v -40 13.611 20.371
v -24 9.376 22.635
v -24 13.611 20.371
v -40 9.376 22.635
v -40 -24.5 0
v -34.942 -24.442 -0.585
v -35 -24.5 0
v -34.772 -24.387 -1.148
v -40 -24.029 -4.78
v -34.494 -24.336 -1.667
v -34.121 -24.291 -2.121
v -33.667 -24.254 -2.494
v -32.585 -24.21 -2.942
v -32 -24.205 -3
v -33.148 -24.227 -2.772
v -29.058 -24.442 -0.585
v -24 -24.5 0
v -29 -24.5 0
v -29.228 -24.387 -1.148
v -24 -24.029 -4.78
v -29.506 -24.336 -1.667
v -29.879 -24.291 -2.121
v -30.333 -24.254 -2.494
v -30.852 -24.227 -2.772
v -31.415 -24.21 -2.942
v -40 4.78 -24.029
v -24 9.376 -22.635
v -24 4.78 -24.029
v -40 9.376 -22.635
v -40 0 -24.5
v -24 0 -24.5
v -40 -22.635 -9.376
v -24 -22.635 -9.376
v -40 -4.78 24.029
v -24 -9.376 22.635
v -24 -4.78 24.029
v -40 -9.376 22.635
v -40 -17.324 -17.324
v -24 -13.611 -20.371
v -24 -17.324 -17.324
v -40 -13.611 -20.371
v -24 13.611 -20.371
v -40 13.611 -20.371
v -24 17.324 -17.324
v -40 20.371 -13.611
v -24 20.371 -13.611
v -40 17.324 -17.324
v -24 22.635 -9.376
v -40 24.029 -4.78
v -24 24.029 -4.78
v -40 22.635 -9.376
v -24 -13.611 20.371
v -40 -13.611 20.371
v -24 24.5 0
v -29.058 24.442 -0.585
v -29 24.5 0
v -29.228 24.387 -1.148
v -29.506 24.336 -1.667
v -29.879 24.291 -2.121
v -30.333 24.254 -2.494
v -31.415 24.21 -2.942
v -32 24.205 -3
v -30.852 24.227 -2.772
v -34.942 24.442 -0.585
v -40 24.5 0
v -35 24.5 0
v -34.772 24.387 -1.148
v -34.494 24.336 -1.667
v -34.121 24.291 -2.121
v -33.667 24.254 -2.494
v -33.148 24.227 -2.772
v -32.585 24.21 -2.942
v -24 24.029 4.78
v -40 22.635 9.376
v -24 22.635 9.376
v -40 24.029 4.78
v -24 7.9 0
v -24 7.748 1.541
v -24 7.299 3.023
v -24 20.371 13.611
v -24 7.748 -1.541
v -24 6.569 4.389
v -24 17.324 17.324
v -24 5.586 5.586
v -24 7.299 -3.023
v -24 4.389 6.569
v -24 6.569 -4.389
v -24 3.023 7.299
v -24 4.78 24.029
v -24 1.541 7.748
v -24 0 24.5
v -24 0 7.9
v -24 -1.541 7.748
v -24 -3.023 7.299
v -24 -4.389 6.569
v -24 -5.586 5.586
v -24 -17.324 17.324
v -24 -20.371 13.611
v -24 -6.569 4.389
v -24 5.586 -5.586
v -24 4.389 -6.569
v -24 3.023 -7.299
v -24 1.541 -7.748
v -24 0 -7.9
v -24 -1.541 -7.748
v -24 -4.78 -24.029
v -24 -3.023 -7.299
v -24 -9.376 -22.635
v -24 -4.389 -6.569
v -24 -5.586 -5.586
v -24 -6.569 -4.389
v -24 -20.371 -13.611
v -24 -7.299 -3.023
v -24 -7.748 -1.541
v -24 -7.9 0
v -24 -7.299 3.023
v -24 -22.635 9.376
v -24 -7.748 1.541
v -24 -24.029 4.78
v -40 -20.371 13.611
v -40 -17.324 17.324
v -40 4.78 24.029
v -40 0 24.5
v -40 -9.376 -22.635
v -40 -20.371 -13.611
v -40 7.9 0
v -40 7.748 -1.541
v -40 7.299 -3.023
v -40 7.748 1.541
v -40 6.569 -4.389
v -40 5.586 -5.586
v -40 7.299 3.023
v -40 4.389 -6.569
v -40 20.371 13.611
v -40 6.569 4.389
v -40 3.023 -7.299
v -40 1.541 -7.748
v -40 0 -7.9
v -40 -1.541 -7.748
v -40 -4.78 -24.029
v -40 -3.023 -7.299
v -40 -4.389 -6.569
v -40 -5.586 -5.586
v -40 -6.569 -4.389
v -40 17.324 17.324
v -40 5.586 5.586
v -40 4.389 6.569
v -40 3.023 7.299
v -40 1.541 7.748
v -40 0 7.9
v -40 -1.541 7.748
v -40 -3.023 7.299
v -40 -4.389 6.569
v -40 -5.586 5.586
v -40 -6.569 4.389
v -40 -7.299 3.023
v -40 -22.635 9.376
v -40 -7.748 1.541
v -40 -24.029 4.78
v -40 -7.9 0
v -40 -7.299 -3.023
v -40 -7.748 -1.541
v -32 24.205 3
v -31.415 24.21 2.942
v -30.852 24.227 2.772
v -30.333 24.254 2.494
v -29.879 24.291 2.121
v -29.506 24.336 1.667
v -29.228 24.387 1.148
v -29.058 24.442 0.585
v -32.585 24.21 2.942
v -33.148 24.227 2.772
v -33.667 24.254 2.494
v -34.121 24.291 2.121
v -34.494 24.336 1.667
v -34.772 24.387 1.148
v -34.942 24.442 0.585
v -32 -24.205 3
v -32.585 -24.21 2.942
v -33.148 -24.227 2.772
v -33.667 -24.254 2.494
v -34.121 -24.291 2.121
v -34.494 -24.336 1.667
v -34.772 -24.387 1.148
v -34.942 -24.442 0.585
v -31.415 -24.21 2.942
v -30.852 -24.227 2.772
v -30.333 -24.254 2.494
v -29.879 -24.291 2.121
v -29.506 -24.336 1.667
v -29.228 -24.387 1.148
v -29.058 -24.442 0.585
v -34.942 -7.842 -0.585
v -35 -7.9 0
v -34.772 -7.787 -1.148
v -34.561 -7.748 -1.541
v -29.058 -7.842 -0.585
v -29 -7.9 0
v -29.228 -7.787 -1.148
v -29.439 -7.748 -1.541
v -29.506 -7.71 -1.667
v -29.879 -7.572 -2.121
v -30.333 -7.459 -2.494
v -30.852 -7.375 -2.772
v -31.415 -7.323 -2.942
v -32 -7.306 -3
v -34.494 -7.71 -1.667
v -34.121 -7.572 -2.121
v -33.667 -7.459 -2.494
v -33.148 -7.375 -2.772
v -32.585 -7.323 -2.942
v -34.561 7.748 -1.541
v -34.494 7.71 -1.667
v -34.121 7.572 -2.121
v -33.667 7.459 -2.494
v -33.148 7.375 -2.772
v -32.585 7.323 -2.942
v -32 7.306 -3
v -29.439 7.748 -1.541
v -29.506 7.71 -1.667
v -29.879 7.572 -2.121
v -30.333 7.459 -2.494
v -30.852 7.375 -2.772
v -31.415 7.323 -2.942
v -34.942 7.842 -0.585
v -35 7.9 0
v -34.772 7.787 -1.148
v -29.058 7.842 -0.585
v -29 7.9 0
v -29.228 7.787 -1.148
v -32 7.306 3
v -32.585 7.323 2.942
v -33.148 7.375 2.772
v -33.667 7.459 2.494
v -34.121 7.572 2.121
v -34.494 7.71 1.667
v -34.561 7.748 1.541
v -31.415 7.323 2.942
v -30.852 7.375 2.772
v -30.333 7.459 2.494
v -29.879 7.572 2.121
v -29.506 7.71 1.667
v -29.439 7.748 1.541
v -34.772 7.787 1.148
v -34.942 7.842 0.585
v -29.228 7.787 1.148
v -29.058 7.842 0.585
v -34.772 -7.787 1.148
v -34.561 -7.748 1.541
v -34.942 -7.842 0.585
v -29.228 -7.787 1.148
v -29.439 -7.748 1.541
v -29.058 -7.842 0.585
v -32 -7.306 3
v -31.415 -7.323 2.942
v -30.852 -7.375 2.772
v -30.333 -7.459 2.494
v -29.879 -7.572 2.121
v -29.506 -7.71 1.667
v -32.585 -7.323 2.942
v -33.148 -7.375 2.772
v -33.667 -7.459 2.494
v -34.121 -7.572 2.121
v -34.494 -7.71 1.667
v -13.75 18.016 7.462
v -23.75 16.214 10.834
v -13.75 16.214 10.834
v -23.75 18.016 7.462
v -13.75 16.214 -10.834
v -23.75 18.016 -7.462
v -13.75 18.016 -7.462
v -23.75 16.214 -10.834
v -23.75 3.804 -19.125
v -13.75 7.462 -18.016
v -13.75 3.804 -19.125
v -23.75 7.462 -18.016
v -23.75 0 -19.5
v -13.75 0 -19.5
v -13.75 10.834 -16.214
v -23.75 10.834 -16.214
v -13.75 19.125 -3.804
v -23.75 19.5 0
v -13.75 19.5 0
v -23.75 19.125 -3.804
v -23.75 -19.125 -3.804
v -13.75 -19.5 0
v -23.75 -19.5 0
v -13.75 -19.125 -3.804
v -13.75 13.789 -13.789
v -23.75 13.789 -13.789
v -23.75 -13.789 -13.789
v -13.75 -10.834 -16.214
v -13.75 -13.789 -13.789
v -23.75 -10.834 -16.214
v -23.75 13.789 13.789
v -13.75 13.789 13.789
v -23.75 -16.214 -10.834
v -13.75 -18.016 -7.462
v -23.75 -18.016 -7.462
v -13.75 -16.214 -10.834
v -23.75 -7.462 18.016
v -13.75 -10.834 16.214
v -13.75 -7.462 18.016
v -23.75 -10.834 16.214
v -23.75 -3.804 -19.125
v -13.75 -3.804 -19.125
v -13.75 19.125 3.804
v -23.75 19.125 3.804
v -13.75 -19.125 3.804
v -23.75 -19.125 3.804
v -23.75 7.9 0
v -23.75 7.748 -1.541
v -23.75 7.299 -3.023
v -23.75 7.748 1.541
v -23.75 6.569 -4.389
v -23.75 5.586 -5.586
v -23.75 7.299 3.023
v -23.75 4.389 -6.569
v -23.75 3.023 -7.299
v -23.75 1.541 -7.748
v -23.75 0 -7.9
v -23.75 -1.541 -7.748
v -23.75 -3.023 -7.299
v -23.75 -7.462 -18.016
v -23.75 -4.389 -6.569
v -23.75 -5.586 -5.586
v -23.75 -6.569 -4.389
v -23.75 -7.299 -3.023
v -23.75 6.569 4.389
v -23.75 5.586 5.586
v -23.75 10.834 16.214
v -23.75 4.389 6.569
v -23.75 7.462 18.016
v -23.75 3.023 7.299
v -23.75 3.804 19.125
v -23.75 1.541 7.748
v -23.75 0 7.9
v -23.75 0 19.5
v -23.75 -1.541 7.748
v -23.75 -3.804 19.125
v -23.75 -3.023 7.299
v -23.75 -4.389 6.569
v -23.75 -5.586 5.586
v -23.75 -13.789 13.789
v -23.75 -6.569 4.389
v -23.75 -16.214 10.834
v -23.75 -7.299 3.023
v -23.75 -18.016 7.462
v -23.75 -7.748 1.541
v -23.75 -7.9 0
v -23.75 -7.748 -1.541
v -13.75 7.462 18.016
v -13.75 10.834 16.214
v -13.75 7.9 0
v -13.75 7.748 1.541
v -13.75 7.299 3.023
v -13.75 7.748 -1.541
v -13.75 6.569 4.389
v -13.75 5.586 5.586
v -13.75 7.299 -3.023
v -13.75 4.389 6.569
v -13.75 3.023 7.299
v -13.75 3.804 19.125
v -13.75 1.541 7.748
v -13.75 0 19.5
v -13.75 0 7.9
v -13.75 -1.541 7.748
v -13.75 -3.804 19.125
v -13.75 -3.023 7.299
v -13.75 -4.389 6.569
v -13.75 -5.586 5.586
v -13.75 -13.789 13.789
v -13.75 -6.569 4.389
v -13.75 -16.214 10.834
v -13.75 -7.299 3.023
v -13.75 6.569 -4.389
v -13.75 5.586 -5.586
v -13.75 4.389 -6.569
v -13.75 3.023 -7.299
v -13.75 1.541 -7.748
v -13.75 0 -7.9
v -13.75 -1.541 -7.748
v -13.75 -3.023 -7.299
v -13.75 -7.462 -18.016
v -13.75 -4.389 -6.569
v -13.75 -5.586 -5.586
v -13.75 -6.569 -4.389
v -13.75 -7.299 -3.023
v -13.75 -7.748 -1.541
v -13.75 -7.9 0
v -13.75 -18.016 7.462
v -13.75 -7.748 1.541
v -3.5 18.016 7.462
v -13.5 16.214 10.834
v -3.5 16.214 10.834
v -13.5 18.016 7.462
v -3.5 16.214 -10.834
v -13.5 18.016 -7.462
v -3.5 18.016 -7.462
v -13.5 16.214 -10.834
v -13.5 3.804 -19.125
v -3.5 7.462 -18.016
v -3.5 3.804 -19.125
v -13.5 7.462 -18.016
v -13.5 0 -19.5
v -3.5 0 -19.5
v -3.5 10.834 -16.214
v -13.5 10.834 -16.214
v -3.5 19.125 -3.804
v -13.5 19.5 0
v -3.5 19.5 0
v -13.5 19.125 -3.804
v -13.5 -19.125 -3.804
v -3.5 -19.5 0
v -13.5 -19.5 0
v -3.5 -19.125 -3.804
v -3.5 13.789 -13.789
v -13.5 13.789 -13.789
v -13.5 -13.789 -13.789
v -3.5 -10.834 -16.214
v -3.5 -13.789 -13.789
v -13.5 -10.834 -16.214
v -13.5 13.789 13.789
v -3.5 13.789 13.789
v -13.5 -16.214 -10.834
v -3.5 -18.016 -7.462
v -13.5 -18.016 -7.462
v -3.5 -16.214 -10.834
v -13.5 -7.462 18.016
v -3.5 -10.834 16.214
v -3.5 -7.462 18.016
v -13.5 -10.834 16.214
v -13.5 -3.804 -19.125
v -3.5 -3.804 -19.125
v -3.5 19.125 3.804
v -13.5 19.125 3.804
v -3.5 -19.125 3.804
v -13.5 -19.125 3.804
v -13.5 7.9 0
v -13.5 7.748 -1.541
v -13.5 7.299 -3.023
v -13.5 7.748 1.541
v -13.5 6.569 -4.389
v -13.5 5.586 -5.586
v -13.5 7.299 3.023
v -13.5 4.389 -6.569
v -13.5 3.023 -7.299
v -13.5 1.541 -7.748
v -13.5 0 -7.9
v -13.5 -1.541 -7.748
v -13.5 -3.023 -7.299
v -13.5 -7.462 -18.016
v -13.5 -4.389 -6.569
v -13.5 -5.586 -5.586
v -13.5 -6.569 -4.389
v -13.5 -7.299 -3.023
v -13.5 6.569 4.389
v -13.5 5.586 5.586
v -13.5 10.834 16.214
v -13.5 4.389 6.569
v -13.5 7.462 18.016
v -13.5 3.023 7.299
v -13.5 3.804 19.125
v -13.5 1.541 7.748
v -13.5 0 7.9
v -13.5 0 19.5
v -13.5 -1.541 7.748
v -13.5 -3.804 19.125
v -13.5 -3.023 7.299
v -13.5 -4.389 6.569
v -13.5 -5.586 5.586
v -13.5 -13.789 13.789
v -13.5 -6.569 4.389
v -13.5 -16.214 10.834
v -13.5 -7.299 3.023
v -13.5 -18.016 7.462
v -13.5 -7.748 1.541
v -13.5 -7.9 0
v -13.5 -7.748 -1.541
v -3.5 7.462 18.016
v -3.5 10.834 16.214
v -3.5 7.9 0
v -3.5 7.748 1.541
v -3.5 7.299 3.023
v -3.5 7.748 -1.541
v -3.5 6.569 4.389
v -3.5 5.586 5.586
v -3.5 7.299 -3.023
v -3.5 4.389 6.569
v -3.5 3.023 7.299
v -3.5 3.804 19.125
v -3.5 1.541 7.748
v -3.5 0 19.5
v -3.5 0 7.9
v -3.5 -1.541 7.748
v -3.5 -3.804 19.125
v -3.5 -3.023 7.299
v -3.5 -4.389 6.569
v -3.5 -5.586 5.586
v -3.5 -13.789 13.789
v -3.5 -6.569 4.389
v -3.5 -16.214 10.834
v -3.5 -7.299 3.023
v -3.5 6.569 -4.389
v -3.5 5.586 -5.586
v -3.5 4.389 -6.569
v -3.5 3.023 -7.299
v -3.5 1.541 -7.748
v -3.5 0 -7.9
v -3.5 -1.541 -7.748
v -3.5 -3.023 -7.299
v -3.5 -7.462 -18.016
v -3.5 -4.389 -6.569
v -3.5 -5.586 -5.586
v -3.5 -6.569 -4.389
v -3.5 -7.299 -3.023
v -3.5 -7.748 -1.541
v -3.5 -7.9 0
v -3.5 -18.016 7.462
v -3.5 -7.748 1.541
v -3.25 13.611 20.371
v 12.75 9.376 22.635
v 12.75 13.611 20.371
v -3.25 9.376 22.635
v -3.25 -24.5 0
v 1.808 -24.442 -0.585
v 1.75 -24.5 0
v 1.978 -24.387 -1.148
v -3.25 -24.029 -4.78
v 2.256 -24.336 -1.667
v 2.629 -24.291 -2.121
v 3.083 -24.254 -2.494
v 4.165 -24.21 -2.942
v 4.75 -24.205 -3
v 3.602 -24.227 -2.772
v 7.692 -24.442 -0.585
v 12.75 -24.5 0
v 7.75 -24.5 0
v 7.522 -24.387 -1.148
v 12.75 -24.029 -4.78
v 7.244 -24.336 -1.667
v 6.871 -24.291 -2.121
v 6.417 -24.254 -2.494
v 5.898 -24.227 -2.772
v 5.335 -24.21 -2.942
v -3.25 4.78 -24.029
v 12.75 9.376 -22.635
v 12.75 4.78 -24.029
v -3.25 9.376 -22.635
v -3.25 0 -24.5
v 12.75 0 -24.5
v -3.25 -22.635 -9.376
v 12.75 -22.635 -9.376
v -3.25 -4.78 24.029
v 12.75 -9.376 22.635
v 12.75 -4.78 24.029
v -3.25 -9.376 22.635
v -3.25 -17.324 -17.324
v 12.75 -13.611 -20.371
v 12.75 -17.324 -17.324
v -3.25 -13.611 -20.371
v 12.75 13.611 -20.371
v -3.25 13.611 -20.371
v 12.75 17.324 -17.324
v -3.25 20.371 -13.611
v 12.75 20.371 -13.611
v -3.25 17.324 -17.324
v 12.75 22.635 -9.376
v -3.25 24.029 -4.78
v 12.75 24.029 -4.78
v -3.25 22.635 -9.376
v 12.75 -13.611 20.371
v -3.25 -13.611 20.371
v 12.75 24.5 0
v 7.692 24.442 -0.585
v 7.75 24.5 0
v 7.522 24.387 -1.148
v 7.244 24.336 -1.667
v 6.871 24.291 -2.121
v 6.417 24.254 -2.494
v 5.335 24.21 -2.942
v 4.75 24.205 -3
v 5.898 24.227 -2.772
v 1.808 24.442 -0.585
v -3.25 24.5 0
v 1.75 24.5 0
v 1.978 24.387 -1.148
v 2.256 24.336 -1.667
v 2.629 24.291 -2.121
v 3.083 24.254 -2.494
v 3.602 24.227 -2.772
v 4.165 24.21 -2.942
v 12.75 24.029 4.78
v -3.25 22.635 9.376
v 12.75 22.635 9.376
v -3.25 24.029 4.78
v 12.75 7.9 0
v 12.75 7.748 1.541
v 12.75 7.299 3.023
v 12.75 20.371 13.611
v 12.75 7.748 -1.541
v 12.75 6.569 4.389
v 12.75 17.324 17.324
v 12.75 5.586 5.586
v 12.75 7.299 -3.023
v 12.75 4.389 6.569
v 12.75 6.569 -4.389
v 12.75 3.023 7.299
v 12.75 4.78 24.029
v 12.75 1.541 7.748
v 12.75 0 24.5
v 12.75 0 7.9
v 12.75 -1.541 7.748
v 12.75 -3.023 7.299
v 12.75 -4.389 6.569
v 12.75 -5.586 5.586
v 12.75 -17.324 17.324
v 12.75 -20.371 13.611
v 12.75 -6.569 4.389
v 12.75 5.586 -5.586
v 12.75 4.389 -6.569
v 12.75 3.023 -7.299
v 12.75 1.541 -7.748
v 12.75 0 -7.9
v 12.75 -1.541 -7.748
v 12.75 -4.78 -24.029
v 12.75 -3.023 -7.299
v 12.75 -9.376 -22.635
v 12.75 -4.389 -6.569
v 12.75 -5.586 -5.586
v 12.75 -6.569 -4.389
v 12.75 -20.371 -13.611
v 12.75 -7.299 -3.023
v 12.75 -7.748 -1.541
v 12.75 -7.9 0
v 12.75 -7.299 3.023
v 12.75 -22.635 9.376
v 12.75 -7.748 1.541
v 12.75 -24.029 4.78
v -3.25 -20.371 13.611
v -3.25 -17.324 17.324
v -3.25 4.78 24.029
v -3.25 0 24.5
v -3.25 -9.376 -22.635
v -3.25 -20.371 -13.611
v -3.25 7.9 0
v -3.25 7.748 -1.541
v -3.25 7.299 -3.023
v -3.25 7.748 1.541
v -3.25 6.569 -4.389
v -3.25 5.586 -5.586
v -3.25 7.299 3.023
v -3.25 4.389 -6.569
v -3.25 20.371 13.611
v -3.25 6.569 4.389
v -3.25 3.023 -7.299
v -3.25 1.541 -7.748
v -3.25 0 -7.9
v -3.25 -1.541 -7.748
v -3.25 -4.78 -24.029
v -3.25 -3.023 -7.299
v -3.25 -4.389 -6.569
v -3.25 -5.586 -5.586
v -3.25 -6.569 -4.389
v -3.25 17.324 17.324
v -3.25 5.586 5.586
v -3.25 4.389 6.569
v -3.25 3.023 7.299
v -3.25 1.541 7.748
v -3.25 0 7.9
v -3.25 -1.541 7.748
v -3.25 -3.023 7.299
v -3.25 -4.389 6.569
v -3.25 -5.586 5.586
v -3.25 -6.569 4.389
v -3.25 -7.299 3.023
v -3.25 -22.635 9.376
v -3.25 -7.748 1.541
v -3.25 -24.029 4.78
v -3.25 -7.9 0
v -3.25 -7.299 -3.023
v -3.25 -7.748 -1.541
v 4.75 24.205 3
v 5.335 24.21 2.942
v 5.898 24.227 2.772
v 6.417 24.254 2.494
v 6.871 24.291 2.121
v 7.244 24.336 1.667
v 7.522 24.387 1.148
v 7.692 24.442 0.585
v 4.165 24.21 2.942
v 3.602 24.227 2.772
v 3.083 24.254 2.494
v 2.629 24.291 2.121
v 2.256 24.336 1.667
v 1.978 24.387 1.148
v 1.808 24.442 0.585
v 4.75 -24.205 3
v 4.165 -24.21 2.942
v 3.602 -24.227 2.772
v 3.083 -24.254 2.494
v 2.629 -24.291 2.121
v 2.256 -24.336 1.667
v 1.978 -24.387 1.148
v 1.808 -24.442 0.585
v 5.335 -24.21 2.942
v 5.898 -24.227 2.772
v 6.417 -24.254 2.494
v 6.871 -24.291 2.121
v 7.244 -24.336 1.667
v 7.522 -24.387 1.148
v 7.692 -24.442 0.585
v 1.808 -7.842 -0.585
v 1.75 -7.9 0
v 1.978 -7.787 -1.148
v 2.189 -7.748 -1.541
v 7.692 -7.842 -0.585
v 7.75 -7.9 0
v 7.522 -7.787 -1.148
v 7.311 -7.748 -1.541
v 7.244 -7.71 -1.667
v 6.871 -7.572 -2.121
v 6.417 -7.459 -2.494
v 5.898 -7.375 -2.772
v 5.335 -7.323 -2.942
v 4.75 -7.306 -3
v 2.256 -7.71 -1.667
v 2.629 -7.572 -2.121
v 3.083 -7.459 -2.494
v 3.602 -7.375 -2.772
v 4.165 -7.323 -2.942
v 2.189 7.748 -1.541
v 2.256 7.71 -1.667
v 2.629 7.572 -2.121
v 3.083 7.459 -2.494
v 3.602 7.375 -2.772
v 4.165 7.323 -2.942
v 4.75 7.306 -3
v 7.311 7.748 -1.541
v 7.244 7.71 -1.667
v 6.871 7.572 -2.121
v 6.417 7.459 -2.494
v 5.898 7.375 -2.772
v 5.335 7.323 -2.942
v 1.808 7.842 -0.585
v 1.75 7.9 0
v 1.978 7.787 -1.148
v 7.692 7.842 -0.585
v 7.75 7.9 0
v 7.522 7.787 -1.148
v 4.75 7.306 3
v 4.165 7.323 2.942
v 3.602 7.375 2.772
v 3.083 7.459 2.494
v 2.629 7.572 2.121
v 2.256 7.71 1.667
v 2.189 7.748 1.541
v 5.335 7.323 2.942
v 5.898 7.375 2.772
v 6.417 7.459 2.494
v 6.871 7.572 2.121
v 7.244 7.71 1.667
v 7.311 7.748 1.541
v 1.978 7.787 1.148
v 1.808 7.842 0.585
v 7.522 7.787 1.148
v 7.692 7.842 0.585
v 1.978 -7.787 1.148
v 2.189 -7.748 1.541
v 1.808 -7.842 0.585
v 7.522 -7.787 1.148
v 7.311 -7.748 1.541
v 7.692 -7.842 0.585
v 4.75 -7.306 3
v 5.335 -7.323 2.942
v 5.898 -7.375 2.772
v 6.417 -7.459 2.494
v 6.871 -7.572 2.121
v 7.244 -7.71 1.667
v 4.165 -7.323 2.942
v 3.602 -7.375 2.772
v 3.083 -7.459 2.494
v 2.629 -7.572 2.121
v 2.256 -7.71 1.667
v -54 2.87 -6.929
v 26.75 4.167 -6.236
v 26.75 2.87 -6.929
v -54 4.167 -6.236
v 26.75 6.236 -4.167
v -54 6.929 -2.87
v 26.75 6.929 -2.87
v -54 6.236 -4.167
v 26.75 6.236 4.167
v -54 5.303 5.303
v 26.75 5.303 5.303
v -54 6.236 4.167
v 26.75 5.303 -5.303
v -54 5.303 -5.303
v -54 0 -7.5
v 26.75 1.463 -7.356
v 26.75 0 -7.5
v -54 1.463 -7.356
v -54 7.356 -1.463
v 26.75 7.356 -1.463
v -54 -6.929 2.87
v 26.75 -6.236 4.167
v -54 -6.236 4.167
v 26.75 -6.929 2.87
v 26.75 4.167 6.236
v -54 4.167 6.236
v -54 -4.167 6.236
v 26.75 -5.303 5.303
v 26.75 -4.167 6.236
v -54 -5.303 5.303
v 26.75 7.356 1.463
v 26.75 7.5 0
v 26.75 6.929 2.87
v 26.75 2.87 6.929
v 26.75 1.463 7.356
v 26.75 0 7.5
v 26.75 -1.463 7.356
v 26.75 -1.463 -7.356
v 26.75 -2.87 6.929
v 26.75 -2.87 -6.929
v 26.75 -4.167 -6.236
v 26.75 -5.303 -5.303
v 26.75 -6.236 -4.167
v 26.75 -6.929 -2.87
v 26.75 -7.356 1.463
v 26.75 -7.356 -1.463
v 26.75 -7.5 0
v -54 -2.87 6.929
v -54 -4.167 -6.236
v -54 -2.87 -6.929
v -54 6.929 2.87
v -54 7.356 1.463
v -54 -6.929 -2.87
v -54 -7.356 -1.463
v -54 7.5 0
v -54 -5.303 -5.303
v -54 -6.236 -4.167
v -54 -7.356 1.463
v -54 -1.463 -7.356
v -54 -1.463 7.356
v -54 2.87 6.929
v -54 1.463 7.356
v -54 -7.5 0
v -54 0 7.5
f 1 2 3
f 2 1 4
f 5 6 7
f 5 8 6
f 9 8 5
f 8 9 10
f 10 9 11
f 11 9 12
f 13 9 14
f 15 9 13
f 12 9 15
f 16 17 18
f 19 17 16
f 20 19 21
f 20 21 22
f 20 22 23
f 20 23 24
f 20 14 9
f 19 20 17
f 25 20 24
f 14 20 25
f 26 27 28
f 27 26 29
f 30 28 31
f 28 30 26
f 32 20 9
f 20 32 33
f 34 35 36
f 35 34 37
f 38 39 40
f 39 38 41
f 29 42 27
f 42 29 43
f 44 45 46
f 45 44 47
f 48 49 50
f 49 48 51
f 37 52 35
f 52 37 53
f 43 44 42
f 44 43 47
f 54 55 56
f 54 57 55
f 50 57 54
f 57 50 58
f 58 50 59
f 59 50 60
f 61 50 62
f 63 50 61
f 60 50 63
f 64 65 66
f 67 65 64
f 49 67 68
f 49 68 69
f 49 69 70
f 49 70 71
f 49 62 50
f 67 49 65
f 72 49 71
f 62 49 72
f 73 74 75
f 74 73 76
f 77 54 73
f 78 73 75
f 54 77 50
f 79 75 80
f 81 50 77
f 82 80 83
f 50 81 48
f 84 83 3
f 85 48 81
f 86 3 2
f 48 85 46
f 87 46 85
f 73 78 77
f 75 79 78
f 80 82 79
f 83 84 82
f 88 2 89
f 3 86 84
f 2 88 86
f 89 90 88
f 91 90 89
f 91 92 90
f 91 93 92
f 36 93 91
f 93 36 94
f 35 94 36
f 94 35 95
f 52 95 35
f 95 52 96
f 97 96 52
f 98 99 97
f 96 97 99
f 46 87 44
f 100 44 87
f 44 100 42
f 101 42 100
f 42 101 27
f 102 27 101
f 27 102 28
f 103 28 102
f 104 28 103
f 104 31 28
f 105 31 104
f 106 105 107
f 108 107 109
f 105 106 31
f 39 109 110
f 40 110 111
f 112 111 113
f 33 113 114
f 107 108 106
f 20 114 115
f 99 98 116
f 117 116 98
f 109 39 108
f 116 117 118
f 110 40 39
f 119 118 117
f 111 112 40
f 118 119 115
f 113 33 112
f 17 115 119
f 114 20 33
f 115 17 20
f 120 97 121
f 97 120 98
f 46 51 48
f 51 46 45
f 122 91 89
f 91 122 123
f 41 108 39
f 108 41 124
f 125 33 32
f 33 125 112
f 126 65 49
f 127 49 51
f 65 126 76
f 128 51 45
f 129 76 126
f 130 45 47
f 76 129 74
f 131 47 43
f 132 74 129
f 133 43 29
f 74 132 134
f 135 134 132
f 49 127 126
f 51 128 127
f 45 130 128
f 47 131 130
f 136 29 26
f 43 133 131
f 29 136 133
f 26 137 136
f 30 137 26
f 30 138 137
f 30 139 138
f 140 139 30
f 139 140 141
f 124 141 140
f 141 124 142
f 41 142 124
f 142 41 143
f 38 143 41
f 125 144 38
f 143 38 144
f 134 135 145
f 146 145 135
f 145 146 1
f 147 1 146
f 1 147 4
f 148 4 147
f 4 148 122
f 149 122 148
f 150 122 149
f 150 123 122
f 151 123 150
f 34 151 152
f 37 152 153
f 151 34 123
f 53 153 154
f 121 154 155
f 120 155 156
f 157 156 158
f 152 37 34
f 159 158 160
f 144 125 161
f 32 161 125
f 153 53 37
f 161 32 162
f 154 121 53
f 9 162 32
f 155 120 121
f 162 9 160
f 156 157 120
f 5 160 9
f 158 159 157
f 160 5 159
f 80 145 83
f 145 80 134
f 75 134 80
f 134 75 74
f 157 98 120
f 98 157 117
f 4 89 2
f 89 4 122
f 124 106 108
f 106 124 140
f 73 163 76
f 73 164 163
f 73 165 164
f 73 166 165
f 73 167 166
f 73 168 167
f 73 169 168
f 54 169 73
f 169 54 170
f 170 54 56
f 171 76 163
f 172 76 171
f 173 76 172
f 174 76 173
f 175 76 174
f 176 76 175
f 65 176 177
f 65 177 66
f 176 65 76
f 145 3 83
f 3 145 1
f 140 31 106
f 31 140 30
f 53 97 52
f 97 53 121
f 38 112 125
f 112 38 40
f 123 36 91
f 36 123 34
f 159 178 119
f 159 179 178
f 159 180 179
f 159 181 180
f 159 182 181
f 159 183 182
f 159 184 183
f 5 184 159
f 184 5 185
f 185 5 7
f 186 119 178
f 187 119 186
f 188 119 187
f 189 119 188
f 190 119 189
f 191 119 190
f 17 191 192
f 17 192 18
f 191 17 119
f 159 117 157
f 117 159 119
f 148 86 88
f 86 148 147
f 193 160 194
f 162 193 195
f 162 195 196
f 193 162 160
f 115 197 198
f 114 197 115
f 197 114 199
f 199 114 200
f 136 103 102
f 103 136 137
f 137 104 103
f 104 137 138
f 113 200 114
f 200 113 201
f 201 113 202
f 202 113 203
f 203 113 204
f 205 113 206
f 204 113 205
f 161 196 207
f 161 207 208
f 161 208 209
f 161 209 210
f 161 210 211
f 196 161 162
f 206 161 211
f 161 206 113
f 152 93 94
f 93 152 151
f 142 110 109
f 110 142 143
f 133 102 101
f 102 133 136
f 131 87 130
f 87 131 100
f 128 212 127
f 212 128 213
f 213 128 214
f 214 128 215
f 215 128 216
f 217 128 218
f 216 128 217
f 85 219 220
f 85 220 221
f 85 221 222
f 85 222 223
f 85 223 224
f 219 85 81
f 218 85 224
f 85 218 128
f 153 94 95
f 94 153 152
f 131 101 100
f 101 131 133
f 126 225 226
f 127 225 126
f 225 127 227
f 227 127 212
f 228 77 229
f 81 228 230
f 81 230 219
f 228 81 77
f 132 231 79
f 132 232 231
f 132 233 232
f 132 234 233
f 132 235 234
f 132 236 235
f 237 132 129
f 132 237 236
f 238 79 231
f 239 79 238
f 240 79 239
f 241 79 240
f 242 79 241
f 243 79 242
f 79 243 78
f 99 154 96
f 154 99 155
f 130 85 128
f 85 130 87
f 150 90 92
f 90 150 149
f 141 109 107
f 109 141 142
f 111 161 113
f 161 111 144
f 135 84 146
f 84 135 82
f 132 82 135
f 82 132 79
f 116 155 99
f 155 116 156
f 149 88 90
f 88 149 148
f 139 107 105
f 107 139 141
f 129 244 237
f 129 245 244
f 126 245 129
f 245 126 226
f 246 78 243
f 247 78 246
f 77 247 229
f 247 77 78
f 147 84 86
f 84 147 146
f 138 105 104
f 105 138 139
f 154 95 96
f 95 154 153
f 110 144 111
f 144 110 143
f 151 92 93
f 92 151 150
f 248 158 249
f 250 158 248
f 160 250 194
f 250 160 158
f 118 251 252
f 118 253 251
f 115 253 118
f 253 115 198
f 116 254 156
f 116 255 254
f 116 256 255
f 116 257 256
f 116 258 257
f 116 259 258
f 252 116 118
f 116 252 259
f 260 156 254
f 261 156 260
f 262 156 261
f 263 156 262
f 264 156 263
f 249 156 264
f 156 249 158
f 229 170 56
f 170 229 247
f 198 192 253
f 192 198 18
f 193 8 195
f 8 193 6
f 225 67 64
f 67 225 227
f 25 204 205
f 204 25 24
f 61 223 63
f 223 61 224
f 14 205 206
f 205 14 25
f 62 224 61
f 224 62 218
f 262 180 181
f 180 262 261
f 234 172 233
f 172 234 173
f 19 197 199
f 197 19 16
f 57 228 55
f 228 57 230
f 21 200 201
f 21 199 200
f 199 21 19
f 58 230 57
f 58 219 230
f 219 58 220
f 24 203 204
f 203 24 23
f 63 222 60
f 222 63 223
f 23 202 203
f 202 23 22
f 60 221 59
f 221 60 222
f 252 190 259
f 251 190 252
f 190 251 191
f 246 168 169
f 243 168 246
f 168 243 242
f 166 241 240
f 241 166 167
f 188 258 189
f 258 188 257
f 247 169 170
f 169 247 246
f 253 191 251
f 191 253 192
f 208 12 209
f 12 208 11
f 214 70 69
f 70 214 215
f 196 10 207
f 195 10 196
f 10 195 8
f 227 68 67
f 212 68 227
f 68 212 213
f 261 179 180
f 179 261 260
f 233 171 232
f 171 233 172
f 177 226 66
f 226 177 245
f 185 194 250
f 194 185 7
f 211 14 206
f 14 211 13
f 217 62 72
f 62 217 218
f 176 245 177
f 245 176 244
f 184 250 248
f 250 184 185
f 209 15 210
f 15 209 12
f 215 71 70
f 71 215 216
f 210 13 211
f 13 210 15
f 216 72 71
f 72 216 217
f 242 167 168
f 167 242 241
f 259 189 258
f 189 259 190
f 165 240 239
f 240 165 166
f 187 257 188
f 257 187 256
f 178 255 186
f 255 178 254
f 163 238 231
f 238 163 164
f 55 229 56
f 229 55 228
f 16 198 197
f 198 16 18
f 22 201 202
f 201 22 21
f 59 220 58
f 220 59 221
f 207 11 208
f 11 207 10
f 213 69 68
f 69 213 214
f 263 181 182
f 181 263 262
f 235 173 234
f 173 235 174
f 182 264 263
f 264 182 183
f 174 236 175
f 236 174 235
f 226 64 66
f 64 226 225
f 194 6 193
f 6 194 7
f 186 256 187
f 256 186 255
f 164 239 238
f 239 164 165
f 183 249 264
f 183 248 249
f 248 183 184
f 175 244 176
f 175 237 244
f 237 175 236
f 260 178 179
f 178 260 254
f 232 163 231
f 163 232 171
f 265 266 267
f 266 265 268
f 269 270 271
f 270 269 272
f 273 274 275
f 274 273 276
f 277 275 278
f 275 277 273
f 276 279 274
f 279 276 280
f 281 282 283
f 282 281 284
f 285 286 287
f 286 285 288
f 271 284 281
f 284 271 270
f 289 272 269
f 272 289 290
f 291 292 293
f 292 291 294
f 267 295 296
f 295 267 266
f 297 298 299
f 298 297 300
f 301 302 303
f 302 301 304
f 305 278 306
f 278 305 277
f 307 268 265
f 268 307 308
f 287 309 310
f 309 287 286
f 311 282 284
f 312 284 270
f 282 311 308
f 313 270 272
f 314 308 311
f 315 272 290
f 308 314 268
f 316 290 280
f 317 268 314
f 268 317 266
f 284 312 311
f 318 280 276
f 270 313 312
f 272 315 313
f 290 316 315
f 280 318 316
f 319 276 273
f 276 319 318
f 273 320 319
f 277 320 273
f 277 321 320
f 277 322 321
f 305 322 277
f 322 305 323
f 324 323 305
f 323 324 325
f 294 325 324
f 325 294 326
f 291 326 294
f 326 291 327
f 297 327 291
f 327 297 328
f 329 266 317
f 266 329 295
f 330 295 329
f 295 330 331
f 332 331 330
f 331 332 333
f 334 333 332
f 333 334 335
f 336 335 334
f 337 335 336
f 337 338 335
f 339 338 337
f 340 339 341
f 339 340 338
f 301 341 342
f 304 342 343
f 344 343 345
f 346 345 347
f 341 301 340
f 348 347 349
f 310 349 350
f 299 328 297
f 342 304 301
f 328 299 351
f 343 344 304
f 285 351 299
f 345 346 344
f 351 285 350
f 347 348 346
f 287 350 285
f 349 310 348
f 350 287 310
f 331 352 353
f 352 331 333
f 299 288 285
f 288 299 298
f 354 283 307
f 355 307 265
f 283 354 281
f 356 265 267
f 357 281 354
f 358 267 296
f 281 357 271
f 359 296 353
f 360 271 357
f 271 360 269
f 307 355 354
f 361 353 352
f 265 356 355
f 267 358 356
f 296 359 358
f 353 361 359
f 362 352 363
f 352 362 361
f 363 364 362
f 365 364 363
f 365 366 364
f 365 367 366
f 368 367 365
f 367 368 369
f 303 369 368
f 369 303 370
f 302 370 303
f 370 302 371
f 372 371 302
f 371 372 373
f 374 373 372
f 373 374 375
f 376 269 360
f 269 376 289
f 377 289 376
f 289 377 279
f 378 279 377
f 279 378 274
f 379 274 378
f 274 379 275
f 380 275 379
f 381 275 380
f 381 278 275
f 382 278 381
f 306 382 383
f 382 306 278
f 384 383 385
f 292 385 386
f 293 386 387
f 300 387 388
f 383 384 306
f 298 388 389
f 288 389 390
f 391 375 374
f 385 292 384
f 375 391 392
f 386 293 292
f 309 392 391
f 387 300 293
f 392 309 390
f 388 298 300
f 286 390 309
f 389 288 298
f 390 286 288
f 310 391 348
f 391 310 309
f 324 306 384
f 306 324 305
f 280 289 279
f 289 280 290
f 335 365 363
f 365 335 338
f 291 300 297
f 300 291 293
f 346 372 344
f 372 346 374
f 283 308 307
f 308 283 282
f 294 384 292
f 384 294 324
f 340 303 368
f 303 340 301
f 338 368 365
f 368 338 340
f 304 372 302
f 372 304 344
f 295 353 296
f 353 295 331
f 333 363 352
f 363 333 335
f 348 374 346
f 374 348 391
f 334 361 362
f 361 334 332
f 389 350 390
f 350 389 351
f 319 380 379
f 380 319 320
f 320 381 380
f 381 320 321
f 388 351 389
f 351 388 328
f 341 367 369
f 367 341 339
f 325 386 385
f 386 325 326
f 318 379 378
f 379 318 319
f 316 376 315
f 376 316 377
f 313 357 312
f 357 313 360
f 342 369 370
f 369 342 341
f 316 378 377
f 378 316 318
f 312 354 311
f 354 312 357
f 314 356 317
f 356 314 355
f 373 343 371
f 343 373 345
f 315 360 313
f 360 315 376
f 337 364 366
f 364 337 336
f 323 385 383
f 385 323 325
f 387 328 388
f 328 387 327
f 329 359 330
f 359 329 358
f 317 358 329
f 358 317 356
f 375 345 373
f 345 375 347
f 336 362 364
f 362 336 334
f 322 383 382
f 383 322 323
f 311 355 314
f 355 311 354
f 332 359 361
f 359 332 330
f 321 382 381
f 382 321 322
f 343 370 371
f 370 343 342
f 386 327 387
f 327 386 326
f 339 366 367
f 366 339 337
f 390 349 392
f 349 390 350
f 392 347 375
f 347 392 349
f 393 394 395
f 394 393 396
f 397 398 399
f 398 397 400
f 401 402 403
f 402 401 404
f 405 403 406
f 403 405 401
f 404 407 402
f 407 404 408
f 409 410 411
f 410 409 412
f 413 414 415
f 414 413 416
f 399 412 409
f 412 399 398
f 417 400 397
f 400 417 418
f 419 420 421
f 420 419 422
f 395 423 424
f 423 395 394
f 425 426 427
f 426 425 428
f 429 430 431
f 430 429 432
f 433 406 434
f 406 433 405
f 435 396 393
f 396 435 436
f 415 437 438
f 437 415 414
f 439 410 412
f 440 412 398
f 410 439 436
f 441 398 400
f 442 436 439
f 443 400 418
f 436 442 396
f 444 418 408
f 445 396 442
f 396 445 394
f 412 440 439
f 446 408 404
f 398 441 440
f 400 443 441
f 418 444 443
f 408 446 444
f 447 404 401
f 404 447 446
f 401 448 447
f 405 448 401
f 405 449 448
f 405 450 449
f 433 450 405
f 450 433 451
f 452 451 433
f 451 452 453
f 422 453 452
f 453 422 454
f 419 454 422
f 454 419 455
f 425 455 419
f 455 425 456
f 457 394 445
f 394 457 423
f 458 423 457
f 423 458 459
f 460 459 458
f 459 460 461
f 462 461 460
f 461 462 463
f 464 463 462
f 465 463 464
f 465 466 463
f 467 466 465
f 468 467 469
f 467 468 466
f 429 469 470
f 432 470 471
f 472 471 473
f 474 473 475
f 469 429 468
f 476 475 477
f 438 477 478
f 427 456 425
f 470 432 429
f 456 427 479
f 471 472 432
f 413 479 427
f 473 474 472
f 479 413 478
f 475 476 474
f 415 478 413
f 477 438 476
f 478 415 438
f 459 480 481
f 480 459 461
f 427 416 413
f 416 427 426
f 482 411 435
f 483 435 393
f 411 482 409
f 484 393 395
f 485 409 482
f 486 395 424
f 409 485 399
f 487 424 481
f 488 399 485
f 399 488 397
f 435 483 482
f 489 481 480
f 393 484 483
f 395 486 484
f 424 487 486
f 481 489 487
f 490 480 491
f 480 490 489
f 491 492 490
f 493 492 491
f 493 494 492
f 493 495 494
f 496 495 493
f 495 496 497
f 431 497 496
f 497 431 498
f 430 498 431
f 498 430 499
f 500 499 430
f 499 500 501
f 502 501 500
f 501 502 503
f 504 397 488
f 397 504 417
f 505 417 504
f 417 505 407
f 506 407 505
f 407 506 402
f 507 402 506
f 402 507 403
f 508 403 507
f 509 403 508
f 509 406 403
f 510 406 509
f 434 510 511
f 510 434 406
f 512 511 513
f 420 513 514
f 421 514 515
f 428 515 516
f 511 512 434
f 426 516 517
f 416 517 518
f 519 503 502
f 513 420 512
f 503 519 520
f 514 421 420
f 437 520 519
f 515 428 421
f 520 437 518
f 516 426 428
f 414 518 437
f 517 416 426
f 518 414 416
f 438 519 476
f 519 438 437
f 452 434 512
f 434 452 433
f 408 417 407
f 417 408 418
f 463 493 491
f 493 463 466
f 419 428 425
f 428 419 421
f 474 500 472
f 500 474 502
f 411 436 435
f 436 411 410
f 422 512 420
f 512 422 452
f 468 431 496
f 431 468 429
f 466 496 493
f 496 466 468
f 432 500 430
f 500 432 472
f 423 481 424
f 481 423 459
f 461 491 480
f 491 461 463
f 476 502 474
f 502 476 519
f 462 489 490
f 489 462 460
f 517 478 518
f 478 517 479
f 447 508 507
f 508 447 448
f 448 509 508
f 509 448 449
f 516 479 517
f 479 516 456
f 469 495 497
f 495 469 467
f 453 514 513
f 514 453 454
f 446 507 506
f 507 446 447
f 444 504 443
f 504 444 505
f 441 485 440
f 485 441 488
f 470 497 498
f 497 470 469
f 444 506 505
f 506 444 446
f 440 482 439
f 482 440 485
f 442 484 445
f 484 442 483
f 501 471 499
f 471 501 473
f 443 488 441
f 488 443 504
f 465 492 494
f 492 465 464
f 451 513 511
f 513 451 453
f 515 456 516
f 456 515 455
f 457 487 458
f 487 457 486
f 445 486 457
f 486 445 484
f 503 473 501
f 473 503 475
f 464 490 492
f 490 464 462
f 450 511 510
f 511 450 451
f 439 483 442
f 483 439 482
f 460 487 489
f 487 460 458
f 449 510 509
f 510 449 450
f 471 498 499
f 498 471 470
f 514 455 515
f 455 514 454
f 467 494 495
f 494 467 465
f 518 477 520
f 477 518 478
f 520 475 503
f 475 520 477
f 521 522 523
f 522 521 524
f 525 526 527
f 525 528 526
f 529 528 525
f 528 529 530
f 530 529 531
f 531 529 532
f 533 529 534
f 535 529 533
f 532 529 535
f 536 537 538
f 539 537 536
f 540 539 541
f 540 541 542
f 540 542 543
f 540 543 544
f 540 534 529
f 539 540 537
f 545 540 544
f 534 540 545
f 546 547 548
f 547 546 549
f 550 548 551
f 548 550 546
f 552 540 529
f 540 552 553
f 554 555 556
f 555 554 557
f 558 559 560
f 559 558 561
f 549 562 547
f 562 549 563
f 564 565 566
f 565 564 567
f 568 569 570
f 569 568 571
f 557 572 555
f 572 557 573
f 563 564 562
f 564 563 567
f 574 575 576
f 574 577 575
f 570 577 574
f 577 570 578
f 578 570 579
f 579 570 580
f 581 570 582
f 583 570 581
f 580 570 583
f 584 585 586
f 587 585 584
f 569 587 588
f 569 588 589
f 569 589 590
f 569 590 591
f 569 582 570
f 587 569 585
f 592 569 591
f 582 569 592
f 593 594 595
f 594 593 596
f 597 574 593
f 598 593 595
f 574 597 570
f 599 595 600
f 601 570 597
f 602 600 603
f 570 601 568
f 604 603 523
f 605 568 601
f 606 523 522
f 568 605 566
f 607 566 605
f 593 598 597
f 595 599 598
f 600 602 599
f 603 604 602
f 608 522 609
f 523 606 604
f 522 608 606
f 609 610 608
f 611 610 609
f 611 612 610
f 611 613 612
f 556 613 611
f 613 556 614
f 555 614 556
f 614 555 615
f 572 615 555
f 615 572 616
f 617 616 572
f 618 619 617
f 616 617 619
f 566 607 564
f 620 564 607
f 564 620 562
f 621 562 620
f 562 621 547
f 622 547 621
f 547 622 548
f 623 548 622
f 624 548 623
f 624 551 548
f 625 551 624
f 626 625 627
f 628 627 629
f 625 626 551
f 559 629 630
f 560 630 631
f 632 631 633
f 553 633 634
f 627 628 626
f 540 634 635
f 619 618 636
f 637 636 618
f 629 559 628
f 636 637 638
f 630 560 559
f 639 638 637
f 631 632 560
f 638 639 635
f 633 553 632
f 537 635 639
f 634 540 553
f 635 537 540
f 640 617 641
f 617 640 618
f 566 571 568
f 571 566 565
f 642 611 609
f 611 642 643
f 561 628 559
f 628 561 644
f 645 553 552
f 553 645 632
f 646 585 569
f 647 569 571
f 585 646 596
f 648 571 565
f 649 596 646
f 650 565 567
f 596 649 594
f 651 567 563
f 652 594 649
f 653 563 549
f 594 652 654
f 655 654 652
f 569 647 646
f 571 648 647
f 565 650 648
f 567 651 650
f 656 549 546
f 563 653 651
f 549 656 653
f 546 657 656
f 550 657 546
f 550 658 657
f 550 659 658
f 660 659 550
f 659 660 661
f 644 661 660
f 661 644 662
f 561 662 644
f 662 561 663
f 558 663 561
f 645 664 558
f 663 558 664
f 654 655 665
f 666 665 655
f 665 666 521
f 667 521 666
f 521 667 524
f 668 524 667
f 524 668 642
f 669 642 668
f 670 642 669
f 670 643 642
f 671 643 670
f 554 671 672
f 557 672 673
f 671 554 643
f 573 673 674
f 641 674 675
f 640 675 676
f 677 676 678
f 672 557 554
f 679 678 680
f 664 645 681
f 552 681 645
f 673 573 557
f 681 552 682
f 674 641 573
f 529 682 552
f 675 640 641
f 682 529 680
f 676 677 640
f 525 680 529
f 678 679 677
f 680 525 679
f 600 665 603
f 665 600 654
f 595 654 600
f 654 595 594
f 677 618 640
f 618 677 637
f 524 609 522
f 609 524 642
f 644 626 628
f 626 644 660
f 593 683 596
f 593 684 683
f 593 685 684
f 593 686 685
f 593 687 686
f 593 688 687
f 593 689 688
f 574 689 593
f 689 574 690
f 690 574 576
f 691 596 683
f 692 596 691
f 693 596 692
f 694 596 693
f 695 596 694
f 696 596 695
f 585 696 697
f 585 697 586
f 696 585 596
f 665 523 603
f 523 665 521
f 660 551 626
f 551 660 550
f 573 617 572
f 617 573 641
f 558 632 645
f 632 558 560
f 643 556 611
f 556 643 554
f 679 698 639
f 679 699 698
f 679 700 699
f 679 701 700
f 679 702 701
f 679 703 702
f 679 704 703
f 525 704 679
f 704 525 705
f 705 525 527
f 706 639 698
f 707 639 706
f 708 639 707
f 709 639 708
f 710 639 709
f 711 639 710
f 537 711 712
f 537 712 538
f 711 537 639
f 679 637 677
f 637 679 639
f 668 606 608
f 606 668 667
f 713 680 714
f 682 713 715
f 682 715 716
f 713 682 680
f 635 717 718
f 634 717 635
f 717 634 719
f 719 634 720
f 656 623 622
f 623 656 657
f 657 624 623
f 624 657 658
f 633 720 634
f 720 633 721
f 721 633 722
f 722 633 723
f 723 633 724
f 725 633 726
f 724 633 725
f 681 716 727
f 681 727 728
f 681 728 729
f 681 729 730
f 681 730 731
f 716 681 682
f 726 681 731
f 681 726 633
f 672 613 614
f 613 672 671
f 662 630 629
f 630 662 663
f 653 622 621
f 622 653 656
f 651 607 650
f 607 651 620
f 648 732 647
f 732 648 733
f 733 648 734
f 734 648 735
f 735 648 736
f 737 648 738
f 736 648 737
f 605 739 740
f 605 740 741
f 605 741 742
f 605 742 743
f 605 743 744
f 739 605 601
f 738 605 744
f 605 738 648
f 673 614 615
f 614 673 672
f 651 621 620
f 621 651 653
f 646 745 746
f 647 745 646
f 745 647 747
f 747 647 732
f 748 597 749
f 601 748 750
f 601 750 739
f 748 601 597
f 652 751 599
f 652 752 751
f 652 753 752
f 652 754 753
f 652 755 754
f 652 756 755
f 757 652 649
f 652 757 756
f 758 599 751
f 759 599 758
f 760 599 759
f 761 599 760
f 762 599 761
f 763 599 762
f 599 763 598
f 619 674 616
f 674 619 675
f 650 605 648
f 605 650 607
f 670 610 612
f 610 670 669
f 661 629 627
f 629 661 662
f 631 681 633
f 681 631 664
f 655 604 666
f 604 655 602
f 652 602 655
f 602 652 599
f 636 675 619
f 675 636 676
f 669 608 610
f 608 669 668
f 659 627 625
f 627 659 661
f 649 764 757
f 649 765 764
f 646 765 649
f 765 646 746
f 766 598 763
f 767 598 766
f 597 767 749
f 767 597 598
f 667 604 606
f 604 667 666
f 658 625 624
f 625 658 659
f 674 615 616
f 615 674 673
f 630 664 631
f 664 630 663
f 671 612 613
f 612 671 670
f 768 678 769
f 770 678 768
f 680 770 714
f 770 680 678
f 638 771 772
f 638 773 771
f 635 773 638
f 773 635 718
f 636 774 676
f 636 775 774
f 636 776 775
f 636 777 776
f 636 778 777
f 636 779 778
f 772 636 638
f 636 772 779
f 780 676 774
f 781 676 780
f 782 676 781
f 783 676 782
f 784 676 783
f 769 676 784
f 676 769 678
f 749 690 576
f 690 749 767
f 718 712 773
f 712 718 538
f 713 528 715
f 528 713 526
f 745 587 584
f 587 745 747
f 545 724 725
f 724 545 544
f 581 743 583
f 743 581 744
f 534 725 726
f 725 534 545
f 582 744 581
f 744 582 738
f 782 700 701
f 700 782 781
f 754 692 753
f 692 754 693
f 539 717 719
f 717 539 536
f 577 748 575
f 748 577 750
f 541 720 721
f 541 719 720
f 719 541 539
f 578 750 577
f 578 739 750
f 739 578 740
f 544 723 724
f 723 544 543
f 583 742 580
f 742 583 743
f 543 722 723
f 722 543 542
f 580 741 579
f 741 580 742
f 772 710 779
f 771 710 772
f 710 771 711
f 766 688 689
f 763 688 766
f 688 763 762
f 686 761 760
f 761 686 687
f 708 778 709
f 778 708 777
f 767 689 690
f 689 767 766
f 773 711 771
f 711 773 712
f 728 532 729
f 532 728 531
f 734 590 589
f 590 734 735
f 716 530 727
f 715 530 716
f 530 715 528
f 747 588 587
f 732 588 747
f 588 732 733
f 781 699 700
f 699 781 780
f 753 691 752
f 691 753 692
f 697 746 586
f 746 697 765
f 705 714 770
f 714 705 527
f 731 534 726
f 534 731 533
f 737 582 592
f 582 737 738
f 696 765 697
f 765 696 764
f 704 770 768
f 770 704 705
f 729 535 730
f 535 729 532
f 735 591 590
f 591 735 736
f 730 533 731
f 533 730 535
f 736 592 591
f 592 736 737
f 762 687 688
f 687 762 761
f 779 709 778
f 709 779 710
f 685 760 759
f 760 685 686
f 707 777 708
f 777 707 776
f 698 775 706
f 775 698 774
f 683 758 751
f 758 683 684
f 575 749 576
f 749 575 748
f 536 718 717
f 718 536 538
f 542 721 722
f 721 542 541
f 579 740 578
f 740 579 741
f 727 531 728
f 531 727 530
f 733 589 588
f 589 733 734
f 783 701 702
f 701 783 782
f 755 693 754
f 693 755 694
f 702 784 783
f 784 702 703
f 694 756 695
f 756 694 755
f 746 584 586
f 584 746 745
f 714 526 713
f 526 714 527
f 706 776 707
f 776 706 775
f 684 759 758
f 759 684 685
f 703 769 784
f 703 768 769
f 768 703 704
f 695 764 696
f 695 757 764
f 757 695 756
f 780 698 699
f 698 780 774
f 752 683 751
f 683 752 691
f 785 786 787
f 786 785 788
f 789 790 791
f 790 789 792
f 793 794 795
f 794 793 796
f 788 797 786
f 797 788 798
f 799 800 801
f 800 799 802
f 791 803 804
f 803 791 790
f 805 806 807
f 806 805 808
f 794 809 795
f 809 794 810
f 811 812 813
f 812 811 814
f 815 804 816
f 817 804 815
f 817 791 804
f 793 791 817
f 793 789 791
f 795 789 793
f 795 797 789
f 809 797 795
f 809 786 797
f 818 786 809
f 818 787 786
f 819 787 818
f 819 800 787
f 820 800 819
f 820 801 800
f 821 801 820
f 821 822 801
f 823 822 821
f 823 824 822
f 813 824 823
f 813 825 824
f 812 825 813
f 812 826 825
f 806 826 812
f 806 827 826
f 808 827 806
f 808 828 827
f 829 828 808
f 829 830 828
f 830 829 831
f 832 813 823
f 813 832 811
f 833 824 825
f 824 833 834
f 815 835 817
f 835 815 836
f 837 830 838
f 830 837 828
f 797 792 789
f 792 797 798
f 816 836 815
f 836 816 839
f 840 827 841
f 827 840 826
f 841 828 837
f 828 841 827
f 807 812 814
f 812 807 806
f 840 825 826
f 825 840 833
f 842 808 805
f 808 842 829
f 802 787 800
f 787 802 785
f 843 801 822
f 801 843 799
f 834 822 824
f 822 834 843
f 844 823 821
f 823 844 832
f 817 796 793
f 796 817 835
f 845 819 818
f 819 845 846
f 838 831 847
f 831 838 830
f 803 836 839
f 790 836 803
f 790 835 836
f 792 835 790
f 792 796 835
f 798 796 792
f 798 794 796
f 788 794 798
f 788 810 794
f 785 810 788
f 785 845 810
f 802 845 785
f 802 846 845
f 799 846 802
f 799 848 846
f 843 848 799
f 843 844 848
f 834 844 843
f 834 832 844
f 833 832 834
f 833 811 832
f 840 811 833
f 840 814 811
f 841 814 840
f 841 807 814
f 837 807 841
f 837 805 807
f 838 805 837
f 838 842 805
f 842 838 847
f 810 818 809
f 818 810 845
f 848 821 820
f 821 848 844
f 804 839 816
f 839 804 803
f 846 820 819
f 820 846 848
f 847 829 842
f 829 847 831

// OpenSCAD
$fn = 32;

// ------------------------------------------------------------------------
// Shaft with rings and collars: d15 shaft, 4 rings
// Every part is its own module, assembly() places them once.
// ------------------------------------------------------------------------

// --- part 1 ---
module shaft() {
  translate([0, 0, -40.375]) cylinder(h = 80.75, d = 15);
}

// --- part 2 ---
module collar_a() {
  difference() {
    cylinder(h = 16, d = 49);
    translate([0, 0, -1]) cylinder(h = 18, d = 15.8);
    translate([0, 0, 8]) rotate([90, 0, 0]) cylinder(h = 51, d = 6, center = true);
  }
}

// --- part 3 ---
module spacer_a() {
  difference() {
      translate([0, 0, 0]) cylinder(h = 10, d = 39);
      translate([0, 0, -1]) cylinder(h = 12, d = 15.8);
    }
}

// --- part 4 ---
module spacer_b() {
  difference() {
      translate([0, 0, 0]) cylinder(h = 10, d = 39);
      translate([0, 0, -1]) cylinder(h = 12, d = 15.8);
    }
}

// --- part 5 ---
module collar_b() {
  difference() {
    cylinder(h = 16, d = 49);
    translate([0, 0, -1]) cylinder(h = 18, d = 15.8);
    translate([0, 0, 8]) rotate([90, 0, 0]) cylinder(h = 51, d = 6, center = true);
  }
}

// --- assembly ---
module assembly() {
  translate([-13.625, 0, 0]) rotate([0, 90, 0]) shaft();
  translate([-40, 0, 0]) rotate([0, 90, 0]) collar_a();
  translate([-23.75, 0, 0]) rotate([0, 90, 0]) spacer_a();
  translate([-13.5, 0, 0]) rotate([0, 90, 0]) spacer_b();
  translate([-3.25, 0, 0]) rotate([0, 90, 0]) collar_b();
}

assembly();
